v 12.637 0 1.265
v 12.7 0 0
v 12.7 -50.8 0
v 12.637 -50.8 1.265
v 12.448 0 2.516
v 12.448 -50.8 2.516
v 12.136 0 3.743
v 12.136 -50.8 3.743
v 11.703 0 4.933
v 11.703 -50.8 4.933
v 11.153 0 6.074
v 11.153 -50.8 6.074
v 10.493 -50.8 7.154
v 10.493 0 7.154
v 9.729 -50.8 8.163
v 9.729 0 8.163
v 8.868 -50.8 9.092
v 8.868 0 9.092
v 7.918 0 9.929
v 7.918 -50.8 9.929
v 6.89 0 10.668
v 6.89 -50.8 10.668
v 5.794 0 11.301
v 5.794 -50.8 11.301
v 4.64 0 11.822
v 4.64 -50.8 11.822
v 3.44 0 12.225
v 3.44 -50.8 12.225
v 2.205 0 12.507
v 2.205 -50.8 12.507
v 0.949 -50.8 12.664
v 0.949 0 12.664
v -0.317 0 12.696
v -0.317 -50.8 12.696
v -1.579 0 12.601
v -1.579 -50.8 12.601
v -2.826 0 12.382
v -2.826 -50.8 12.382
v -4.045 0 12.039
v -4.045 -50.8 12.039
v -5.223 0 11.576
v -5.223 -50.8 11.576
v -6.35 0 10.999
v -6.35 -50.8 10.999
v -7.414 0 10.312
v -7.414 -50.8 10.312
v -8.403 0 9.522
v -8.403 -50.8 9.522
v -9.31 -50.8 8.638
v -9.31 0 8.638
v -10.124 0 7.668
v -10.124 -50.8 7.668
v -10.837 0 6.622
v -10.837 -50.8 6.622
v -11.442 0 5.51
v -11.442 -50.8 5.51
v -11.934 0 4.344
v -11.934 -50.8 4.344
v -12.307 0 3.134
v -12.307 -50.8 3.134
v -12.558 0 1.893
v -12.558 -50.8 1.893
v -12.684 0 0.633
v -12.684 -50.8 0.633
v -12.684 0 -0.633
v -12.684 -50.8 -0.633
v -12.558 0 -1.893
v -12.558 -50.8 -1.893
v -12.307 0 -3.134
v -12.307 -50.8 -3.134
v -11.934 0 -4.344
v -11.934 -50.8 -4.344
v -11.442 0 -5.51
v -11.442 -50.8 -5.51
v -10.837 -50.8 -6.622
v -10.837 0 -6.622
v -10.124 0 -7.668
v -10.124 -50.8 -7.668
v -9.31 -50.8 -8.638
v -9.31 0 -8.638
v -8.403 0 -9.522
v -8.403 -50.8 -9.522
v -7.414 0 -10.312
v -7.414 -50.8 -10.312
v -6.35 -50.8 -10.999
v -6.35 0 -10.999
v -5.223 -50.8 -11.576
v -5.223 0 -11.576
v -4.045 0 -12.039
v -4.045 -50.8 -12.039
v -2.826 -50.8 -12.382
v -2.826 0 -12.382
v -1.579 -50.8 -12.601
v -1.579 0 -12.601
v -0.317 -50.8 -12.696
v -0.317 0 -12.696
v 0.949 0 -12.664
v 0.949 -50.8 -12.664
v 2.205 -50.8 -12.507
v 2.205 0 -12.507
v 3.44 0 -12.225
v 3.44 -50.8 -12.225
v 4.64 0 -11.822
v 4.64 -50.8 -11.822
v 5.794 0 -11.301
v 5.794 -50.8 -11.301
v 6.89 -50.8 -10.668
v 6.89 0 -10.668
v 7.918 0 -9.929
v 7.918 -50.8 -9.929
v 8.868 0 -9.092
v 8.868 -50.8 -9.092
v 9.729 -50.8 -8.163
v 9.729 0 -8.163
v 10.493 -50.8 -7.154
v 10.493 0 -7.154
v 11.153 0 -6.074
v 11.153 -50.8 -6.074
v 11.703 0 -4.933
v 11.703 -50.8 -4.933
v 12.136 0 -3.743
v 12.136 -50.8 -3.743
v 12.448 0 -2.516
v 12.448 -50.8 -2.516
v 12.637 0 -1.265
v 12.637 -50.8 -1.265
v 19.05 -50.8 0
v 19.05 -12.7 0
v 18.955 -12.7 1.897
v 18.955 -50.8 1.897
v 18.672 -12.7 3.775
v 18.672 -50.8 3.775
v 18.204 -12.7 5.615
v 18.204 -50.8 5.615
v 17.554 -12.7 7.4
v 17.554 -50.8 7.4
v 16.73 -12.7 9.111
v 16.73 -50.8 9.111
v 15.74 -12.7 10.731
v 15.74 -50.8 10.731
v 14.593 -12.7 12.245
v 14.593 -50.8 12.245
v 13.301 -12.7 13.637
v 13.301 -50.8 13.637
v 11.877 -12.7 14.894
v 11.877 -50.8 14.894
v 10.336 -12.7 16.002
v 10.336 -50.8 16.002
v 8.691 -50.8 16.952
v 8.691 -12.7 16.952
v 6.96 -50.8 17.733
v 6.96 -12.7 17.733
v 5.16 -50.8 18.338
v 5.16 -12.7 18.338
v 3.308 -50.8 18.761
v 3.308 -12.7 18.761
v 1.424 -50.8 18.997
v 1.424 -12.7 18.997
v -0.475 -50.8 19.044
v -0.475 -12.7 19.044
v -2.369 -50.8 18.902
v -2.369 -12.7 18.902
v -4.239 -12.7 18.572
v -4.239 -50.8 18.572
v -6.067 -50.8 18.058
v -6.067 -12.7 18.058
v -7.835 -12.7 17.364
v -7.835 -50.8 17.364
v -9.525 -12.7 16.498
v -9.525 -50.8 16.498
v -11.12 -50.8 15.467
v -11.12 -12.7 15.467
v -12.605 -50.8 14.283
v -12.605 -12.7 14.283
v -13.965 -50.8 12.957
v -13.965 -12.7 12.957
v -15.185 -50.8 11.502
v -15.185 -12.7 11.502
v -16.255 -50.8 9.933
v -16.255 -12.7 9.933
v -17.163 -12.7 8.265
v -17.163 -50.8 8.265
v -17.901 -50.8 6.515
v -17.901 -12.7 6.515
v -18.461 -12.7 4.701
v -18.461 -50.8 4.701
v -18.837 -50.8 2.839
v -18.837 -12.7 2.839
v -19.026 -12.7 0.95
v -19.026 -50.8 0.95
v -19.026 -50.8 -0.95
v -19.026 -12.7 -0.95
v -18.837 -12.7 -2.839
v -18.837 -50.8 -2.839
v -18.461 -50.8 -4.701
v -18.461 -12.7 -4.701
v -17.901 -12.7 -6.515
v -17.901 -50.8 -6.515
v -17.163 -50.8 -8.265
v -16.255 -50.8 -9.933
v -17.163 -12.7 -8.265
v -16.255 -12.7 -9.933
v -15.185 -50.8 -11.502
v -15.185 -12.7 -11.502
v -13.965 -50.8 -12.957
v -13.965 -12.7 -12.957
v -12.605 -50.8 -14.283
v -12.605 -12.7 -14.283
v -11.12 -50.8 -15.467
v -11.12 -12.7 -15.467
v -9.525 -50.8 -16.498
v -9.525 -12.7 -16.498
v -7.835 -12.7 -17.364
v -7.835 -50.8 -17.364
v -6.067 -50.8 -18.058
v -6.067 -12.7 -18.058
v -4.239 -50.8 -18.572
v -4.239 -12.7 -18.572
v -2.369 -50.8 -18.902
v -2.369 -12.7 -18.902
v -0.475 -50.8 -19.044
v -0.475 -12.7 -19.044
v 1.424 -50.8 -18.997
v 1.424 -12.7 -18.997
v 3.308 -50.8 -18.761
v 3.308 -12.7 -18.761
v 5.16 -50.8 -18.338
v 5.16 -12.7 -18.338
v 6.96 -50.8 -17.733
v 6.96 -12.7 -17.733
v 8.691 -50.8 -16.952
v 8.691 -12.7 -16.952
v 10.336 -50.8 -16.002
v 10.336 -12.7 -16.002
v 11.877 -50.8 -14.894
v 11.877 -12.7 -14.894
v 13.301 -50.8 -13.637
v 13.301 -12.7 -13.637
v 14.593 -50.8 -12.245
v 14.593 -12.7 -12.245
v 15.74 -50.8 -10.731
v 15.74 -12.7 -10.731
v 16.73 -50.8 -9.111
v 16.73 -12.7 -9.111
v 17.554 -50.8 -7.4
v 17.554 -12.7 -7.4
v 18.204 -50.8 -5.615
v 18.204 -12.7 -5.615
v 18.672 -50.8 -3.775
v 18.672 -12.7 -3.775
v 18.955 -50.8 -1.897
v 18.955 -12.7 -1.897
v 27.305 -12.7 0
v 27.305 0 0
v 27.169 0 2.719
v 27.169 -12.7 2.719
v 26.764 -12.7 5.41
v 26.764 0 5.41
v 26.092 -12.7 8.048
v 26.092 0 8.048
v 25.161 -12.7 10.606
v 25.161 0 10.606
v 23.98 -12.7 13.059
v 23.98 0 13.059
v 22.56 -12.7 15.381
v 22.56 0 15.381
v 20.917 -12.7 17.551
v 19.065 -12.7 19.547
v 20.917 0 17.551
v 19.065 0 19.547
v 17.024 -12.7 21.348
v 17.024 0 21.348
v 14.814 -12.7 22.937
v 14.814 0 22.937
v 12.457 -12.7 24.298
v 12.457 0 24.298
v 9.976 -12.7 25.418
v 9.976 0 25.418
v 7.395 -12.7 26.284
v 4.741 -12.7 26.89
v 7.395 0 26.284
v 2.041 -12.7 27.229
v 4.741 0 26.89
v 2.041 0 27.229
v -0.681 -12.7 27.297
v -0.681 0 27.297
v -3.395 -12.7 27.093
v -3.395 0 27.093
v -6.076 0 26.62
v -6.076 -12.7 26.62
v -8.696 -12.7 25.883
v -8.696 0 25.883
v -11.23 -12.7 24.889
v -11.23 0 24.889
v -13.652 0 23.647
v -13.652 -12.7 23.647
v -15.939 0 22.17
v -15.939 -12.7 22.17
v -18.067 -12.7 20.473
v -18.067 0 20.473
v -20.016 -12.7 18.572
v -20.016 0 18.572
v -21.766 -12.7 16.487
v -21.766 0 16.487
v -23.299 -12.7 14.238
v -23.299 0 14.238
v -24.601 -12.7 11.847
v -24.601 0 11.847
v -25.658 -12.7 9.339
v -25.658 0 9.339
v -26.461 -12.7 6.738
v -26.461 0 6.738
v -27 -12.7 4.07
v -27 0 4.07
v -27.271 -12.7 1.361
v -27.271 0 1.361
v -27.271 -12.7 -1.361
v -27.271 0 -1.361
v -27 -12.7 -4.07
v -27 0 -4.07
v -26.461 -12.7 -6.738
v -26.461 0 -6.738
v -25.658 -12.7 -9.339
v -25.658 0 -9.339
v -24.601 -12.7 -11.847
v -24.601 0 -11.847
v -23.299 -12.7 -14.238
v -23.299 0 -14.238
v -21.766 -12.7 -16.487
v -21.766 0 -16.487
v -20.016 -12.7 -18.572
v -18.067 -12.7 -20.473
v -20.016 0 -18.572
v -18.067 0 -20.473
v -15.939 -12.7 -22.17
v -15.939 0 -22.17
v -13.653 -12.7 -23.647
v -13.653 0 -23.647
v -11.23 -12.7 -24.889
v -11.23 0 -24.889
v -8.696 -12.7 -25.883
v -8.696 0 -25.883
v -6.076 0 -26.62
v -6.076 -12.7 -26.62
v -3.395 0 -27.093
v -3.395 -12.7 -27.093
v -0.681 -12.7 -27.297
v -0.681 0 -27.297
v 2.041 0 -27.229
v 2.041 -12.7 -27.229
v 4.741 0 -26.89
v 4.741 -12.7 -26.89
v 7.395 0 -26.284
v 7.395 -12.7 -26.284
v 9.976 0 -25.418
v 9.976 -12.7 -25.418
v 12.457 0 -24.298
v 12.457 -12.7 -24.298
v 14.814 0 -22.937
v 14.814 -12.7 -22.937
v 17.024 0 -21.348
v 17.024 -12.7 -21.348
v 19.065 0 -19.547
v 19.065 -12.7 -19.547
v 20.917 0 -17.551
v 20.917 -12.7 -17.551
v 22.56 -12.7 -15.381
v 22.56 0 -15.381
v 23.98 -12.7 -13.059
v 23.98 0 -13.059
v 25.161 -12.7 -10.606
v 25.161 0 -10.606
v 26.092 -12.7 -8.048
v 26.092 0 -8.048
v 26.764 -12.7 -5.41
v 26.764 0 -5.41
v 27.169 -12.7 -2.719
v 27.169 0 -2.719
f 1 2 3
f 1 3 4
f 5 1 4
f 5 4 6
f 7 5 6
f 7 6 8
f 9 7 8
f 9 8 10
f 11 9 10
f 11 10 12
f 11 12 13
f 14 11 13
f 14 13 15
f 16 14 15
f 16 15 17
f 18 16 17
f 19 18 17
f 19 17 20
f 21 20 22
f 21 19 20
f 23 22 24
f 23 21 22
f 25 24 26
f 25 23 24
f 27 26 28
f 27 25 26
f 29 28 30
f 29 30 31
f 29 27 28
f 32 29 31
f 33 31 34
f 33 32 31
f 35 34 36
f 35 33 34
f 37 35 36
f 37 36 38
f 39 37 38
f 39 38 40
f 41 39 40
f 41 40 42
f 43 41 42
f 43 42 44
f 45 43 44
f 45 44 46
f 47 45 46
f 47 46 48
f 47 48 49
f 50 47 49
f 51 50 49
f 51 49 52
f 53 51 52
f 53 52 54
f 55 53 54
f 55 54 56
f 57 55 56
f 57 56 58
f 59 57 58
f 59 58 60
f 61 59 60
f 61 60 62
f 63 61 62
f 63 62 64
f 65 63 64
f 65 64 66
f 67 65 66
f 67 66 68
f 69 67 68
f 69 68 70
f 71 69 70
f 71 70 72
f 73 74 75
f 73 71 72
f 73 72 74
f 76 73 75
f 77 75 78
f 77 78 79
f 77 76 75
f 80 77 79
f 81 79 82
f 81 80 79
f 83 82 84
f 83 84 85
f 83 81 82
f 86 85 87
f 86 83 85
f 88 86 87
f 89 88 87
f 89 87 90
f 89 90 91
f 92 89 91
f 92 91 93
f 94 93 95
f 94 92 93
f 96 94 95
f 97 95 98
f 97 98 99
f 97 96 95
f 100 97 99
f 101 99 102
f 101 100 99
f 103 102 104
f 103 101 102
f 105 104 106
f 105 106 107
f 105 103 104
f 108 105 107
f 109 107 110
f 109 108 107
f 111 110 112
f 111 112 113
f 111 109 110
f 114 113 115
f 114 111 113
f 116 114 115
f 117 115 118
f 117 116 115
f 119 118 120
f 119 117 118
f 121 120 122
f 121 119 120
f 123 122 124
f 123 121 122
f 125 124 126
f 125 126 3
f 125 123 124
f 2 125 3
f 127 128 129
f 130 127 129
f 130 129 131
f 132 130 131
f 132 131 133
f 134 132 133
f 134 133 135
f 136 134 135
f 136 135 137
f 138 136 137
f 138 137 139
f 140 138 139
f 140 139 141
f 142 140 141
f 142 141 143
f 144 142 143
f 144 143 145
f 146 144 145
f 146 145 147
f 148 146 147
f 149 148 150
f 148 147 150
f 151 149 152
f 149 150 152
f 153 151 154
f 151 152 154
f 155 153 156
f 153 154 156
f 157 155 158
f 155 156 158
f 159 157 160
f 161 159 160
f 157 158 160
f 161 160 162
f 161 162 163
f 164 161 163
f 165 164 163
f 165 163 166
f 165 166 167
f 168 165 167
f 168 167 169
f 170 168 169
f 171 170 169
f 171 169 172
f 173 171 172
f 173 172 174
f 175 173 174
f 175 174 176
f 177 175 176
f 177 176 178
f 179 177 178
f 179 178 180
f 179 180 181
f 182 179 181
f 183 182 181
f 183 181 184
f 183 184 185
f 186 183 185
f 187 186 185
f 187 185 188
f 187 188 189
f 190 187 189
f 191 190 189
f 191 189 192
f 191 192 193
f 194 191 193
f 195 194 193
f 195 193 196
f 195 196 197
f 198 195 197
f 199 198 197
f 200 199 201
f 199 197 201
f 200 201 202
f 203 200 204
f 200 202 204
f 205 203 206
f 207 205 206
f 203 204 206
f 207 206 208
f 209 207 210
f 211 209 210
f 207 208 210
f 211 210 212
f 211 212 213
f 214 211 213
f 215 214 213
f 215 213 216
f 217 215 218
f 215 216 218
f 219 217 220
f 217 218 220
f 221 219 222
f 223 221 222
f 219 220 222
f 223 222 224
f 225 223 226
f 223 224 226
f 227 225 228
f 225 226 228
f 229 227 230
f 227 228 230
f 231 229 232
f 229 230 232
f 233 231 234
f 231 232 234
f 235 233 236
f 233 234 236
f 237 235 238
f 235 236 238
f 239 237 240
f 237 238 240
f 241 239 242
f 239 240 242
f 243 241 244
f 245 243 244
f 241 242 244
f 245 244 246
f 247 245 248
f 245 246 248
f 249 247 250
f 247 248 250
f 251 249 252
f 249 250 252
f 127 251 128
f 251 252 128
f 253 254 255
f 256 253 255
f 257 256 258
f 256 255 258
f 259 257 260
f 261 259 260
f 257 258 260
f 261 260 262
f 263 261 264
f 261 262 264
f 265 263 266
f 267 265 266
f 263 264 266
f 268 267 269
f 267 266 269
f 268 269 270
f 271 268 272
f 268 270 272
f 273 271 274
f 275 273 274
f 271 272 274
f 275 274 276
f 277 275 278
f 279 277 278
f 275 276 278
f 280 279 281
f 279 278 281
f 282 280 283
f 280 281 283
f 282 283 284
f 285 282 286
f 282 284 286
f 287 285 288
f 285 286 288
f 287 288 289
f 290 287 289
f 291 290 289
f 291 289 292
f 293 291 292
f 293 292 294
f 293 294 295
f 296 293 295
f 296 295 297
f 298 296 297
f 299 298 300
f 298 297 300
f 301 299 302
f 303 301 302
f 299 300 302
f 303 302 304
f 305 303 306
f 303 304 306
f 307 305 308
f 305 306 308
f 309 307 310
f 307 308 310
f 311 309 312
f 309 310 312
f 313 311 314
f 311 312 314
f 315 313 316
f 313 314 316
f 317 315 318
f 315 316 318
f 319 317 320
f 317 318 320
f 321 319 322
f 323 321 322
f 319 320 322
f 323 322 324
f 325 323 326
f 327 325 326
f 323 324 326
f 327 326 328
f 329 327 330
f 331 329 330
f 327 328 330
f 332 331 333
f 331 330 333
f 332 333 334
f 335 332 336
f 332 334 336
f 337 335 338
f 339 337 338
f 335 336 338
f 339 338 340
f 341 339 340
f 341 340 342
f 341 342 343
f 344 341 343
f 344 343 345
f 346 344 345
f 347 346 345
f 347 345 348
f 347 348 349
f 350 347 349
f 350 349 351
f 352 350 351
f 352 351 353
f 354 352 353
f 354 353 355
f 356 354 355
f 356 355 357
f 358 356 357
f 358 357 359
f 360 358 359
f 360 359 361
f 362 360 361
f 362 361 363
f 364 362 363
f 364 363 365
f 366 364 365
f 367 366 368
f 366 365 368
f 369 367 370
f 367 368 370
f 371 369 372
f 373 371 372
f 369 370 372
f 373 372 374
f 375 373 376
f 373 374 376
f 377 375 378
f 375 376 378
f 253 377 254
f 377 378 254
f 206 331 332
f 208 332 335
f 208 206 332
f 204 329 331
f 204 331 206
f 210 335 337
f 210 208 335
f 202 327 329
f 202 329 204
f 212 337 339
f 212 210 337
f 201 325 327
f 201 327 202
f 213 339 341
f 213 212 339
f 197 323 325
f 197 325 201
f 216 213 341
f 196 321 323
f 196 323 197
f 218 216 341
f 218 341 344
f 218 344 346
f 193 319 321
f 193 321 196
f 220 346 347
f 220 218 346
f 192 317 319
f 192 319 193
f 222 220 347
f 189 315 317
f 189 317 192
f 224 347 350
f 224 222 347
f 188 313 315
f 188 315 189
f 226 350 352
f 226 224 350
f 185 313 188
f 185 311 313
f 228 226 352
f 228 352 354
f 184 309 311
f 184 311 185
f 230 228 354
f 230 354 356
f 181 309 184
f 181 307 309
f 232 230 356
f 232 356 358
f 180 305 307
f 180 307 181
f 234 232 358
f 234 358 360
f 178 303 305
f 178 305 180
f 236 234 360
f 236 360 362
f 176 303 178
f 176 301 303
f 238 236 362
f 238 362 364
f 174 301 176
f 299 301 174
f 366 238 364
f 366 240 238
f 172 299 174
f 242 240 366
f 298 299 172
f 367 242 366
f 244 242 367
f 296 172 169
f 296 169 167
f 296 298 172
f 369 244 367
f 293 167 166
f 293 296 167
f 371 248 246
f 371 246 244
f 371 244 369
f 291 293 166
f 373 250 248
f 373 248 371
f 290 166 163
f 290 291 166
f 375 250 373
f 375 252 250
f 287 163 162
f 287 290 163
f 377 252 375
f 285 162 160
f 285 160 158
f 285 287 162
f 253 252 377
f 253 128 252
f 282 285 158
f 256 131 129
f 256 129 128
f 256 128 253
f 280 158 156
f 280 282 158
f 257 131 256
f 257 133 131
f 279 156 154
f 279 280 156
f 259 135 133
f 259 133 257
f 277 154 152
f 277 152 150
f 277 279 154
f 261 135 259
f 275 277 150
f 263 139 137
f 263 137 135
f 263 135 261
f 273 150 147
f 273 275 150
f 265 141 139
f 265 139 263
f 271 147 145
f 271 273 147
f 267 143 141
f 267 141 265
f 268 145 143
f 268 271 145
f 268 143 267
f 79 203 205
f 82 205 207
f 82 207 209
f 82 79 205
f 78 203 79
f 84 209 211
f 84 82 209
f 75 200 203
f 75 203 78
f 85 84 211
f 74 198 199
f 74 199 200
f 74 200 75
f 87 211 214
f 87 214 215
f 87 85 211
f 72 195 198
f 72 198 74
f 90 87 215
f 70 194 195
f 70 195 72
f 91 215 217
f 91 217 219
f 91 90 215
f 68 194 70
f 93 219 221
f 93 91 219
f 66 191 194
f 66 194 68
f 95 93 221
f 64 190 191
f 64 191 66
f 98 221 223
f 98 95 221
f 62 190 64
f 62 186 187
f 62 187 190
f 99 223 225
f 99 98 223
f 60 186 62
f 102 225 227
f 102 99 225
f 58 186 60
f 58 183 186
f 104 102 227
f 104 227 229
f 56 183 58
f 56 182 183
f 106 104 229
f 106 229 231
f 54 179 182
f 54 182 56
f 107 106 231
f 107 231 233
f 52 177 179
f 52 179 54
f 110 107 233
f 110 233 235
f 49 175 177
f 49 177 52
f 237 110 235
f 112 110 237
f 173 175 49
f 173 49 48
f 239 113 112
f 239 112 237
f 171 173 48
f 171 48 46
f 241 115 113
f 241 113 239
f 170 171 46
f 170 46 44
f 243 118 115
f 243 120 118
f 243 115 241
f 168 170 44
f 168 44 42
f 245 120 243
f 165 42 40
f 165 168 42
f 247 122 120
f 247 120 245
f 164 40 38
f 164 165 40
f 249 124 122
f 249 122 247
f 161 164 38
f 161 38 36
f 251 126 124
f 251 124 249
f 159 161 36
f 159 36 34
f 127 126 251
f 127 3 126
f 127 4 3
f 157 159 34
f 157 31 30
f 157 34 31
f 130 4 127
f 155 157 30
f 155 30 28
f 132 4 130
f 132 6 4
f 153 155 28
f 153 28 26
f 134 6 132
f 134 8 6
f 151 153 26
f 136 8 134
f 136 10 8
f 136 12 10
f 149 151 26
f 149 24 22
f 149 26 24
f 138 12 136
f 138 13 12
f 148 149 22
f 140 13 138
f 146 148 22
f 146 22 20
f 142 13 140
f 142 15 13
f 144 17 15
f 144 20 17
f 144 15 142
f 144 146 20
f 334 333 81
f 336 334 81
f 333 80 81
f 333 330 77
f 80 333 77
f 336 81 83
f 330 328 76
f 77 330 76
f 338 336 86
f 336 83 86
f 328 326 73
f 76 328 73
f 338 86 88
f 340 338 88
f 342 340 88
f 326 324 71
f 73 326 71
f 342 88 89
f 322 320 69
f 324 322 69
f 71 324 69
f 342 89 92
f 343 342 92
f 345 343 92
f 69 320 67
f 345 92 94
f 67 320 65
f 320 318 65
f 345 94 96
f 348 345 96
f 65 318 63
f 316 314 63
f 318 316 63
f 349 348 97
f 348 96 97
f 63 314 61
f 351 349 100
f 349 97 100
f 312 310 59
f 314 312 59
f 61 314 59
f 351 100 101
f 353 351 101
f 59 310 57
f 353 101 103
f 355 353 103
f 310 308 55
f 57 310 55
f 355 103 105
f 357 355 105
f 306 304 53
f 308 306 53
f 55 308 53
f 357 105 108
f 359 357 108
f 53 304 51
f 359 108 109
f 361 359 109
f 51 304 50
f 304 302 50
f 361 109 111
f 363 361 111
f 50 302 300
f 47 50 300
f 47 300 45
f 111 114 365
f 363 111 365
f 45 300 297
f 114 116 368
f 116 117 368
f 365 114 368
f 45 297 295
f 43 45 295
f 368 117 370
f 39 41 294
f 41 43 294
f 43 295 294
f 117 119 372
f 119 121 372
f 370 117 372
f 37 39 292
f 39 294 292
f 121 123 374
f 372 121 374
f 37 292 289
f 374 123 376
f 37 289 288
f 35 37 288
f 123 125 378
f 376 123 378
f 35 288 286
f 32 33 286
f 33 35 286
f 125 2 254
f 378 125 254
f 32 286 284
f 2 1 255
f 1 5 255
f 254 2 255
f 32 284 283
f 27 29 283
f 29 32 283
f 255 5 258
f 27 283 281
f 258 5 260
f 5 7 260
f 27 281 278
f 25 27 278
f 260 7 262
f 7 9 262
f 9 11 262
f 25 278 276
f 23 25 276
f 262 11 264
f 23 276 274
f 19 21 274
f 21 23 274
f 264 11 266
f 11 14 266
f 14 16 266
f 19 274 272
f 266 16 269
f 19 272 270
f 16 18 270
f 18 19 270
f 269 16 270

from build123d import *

# Parameters (mm, degrees)
F0_R     = 19.05
F0_R_2   = 12.7
F1_DEPTH = 50.8
F2_R     = 27.305
F3_DEPTH = 12.7
F4_DEPTH = 42.750418


with BuildPart() as f1:
    # F0 (on Front) → F1 (new body)
    with BuildSketch(Plane.XZ):
        Circle(F0_R)
        Circle(F0_R_2, mode=Mode.SUBTRACT)
    extrude(amount=F1_DEPTH)

    # F2 (on Front) → F3 (join)
    with BuildSketch(Plane.XZ):
        Circle(F2_R)
    extrude(amount=F3_DEPTH)

    # F0 (on Front) → F4 (cut)
    with BuildSketch(Plane.XZ):
        Circle(F0_R_2)
    extrude(amount=F4_DEPTH, mode=Mode.SUBTRACT)


solid = f1.part
